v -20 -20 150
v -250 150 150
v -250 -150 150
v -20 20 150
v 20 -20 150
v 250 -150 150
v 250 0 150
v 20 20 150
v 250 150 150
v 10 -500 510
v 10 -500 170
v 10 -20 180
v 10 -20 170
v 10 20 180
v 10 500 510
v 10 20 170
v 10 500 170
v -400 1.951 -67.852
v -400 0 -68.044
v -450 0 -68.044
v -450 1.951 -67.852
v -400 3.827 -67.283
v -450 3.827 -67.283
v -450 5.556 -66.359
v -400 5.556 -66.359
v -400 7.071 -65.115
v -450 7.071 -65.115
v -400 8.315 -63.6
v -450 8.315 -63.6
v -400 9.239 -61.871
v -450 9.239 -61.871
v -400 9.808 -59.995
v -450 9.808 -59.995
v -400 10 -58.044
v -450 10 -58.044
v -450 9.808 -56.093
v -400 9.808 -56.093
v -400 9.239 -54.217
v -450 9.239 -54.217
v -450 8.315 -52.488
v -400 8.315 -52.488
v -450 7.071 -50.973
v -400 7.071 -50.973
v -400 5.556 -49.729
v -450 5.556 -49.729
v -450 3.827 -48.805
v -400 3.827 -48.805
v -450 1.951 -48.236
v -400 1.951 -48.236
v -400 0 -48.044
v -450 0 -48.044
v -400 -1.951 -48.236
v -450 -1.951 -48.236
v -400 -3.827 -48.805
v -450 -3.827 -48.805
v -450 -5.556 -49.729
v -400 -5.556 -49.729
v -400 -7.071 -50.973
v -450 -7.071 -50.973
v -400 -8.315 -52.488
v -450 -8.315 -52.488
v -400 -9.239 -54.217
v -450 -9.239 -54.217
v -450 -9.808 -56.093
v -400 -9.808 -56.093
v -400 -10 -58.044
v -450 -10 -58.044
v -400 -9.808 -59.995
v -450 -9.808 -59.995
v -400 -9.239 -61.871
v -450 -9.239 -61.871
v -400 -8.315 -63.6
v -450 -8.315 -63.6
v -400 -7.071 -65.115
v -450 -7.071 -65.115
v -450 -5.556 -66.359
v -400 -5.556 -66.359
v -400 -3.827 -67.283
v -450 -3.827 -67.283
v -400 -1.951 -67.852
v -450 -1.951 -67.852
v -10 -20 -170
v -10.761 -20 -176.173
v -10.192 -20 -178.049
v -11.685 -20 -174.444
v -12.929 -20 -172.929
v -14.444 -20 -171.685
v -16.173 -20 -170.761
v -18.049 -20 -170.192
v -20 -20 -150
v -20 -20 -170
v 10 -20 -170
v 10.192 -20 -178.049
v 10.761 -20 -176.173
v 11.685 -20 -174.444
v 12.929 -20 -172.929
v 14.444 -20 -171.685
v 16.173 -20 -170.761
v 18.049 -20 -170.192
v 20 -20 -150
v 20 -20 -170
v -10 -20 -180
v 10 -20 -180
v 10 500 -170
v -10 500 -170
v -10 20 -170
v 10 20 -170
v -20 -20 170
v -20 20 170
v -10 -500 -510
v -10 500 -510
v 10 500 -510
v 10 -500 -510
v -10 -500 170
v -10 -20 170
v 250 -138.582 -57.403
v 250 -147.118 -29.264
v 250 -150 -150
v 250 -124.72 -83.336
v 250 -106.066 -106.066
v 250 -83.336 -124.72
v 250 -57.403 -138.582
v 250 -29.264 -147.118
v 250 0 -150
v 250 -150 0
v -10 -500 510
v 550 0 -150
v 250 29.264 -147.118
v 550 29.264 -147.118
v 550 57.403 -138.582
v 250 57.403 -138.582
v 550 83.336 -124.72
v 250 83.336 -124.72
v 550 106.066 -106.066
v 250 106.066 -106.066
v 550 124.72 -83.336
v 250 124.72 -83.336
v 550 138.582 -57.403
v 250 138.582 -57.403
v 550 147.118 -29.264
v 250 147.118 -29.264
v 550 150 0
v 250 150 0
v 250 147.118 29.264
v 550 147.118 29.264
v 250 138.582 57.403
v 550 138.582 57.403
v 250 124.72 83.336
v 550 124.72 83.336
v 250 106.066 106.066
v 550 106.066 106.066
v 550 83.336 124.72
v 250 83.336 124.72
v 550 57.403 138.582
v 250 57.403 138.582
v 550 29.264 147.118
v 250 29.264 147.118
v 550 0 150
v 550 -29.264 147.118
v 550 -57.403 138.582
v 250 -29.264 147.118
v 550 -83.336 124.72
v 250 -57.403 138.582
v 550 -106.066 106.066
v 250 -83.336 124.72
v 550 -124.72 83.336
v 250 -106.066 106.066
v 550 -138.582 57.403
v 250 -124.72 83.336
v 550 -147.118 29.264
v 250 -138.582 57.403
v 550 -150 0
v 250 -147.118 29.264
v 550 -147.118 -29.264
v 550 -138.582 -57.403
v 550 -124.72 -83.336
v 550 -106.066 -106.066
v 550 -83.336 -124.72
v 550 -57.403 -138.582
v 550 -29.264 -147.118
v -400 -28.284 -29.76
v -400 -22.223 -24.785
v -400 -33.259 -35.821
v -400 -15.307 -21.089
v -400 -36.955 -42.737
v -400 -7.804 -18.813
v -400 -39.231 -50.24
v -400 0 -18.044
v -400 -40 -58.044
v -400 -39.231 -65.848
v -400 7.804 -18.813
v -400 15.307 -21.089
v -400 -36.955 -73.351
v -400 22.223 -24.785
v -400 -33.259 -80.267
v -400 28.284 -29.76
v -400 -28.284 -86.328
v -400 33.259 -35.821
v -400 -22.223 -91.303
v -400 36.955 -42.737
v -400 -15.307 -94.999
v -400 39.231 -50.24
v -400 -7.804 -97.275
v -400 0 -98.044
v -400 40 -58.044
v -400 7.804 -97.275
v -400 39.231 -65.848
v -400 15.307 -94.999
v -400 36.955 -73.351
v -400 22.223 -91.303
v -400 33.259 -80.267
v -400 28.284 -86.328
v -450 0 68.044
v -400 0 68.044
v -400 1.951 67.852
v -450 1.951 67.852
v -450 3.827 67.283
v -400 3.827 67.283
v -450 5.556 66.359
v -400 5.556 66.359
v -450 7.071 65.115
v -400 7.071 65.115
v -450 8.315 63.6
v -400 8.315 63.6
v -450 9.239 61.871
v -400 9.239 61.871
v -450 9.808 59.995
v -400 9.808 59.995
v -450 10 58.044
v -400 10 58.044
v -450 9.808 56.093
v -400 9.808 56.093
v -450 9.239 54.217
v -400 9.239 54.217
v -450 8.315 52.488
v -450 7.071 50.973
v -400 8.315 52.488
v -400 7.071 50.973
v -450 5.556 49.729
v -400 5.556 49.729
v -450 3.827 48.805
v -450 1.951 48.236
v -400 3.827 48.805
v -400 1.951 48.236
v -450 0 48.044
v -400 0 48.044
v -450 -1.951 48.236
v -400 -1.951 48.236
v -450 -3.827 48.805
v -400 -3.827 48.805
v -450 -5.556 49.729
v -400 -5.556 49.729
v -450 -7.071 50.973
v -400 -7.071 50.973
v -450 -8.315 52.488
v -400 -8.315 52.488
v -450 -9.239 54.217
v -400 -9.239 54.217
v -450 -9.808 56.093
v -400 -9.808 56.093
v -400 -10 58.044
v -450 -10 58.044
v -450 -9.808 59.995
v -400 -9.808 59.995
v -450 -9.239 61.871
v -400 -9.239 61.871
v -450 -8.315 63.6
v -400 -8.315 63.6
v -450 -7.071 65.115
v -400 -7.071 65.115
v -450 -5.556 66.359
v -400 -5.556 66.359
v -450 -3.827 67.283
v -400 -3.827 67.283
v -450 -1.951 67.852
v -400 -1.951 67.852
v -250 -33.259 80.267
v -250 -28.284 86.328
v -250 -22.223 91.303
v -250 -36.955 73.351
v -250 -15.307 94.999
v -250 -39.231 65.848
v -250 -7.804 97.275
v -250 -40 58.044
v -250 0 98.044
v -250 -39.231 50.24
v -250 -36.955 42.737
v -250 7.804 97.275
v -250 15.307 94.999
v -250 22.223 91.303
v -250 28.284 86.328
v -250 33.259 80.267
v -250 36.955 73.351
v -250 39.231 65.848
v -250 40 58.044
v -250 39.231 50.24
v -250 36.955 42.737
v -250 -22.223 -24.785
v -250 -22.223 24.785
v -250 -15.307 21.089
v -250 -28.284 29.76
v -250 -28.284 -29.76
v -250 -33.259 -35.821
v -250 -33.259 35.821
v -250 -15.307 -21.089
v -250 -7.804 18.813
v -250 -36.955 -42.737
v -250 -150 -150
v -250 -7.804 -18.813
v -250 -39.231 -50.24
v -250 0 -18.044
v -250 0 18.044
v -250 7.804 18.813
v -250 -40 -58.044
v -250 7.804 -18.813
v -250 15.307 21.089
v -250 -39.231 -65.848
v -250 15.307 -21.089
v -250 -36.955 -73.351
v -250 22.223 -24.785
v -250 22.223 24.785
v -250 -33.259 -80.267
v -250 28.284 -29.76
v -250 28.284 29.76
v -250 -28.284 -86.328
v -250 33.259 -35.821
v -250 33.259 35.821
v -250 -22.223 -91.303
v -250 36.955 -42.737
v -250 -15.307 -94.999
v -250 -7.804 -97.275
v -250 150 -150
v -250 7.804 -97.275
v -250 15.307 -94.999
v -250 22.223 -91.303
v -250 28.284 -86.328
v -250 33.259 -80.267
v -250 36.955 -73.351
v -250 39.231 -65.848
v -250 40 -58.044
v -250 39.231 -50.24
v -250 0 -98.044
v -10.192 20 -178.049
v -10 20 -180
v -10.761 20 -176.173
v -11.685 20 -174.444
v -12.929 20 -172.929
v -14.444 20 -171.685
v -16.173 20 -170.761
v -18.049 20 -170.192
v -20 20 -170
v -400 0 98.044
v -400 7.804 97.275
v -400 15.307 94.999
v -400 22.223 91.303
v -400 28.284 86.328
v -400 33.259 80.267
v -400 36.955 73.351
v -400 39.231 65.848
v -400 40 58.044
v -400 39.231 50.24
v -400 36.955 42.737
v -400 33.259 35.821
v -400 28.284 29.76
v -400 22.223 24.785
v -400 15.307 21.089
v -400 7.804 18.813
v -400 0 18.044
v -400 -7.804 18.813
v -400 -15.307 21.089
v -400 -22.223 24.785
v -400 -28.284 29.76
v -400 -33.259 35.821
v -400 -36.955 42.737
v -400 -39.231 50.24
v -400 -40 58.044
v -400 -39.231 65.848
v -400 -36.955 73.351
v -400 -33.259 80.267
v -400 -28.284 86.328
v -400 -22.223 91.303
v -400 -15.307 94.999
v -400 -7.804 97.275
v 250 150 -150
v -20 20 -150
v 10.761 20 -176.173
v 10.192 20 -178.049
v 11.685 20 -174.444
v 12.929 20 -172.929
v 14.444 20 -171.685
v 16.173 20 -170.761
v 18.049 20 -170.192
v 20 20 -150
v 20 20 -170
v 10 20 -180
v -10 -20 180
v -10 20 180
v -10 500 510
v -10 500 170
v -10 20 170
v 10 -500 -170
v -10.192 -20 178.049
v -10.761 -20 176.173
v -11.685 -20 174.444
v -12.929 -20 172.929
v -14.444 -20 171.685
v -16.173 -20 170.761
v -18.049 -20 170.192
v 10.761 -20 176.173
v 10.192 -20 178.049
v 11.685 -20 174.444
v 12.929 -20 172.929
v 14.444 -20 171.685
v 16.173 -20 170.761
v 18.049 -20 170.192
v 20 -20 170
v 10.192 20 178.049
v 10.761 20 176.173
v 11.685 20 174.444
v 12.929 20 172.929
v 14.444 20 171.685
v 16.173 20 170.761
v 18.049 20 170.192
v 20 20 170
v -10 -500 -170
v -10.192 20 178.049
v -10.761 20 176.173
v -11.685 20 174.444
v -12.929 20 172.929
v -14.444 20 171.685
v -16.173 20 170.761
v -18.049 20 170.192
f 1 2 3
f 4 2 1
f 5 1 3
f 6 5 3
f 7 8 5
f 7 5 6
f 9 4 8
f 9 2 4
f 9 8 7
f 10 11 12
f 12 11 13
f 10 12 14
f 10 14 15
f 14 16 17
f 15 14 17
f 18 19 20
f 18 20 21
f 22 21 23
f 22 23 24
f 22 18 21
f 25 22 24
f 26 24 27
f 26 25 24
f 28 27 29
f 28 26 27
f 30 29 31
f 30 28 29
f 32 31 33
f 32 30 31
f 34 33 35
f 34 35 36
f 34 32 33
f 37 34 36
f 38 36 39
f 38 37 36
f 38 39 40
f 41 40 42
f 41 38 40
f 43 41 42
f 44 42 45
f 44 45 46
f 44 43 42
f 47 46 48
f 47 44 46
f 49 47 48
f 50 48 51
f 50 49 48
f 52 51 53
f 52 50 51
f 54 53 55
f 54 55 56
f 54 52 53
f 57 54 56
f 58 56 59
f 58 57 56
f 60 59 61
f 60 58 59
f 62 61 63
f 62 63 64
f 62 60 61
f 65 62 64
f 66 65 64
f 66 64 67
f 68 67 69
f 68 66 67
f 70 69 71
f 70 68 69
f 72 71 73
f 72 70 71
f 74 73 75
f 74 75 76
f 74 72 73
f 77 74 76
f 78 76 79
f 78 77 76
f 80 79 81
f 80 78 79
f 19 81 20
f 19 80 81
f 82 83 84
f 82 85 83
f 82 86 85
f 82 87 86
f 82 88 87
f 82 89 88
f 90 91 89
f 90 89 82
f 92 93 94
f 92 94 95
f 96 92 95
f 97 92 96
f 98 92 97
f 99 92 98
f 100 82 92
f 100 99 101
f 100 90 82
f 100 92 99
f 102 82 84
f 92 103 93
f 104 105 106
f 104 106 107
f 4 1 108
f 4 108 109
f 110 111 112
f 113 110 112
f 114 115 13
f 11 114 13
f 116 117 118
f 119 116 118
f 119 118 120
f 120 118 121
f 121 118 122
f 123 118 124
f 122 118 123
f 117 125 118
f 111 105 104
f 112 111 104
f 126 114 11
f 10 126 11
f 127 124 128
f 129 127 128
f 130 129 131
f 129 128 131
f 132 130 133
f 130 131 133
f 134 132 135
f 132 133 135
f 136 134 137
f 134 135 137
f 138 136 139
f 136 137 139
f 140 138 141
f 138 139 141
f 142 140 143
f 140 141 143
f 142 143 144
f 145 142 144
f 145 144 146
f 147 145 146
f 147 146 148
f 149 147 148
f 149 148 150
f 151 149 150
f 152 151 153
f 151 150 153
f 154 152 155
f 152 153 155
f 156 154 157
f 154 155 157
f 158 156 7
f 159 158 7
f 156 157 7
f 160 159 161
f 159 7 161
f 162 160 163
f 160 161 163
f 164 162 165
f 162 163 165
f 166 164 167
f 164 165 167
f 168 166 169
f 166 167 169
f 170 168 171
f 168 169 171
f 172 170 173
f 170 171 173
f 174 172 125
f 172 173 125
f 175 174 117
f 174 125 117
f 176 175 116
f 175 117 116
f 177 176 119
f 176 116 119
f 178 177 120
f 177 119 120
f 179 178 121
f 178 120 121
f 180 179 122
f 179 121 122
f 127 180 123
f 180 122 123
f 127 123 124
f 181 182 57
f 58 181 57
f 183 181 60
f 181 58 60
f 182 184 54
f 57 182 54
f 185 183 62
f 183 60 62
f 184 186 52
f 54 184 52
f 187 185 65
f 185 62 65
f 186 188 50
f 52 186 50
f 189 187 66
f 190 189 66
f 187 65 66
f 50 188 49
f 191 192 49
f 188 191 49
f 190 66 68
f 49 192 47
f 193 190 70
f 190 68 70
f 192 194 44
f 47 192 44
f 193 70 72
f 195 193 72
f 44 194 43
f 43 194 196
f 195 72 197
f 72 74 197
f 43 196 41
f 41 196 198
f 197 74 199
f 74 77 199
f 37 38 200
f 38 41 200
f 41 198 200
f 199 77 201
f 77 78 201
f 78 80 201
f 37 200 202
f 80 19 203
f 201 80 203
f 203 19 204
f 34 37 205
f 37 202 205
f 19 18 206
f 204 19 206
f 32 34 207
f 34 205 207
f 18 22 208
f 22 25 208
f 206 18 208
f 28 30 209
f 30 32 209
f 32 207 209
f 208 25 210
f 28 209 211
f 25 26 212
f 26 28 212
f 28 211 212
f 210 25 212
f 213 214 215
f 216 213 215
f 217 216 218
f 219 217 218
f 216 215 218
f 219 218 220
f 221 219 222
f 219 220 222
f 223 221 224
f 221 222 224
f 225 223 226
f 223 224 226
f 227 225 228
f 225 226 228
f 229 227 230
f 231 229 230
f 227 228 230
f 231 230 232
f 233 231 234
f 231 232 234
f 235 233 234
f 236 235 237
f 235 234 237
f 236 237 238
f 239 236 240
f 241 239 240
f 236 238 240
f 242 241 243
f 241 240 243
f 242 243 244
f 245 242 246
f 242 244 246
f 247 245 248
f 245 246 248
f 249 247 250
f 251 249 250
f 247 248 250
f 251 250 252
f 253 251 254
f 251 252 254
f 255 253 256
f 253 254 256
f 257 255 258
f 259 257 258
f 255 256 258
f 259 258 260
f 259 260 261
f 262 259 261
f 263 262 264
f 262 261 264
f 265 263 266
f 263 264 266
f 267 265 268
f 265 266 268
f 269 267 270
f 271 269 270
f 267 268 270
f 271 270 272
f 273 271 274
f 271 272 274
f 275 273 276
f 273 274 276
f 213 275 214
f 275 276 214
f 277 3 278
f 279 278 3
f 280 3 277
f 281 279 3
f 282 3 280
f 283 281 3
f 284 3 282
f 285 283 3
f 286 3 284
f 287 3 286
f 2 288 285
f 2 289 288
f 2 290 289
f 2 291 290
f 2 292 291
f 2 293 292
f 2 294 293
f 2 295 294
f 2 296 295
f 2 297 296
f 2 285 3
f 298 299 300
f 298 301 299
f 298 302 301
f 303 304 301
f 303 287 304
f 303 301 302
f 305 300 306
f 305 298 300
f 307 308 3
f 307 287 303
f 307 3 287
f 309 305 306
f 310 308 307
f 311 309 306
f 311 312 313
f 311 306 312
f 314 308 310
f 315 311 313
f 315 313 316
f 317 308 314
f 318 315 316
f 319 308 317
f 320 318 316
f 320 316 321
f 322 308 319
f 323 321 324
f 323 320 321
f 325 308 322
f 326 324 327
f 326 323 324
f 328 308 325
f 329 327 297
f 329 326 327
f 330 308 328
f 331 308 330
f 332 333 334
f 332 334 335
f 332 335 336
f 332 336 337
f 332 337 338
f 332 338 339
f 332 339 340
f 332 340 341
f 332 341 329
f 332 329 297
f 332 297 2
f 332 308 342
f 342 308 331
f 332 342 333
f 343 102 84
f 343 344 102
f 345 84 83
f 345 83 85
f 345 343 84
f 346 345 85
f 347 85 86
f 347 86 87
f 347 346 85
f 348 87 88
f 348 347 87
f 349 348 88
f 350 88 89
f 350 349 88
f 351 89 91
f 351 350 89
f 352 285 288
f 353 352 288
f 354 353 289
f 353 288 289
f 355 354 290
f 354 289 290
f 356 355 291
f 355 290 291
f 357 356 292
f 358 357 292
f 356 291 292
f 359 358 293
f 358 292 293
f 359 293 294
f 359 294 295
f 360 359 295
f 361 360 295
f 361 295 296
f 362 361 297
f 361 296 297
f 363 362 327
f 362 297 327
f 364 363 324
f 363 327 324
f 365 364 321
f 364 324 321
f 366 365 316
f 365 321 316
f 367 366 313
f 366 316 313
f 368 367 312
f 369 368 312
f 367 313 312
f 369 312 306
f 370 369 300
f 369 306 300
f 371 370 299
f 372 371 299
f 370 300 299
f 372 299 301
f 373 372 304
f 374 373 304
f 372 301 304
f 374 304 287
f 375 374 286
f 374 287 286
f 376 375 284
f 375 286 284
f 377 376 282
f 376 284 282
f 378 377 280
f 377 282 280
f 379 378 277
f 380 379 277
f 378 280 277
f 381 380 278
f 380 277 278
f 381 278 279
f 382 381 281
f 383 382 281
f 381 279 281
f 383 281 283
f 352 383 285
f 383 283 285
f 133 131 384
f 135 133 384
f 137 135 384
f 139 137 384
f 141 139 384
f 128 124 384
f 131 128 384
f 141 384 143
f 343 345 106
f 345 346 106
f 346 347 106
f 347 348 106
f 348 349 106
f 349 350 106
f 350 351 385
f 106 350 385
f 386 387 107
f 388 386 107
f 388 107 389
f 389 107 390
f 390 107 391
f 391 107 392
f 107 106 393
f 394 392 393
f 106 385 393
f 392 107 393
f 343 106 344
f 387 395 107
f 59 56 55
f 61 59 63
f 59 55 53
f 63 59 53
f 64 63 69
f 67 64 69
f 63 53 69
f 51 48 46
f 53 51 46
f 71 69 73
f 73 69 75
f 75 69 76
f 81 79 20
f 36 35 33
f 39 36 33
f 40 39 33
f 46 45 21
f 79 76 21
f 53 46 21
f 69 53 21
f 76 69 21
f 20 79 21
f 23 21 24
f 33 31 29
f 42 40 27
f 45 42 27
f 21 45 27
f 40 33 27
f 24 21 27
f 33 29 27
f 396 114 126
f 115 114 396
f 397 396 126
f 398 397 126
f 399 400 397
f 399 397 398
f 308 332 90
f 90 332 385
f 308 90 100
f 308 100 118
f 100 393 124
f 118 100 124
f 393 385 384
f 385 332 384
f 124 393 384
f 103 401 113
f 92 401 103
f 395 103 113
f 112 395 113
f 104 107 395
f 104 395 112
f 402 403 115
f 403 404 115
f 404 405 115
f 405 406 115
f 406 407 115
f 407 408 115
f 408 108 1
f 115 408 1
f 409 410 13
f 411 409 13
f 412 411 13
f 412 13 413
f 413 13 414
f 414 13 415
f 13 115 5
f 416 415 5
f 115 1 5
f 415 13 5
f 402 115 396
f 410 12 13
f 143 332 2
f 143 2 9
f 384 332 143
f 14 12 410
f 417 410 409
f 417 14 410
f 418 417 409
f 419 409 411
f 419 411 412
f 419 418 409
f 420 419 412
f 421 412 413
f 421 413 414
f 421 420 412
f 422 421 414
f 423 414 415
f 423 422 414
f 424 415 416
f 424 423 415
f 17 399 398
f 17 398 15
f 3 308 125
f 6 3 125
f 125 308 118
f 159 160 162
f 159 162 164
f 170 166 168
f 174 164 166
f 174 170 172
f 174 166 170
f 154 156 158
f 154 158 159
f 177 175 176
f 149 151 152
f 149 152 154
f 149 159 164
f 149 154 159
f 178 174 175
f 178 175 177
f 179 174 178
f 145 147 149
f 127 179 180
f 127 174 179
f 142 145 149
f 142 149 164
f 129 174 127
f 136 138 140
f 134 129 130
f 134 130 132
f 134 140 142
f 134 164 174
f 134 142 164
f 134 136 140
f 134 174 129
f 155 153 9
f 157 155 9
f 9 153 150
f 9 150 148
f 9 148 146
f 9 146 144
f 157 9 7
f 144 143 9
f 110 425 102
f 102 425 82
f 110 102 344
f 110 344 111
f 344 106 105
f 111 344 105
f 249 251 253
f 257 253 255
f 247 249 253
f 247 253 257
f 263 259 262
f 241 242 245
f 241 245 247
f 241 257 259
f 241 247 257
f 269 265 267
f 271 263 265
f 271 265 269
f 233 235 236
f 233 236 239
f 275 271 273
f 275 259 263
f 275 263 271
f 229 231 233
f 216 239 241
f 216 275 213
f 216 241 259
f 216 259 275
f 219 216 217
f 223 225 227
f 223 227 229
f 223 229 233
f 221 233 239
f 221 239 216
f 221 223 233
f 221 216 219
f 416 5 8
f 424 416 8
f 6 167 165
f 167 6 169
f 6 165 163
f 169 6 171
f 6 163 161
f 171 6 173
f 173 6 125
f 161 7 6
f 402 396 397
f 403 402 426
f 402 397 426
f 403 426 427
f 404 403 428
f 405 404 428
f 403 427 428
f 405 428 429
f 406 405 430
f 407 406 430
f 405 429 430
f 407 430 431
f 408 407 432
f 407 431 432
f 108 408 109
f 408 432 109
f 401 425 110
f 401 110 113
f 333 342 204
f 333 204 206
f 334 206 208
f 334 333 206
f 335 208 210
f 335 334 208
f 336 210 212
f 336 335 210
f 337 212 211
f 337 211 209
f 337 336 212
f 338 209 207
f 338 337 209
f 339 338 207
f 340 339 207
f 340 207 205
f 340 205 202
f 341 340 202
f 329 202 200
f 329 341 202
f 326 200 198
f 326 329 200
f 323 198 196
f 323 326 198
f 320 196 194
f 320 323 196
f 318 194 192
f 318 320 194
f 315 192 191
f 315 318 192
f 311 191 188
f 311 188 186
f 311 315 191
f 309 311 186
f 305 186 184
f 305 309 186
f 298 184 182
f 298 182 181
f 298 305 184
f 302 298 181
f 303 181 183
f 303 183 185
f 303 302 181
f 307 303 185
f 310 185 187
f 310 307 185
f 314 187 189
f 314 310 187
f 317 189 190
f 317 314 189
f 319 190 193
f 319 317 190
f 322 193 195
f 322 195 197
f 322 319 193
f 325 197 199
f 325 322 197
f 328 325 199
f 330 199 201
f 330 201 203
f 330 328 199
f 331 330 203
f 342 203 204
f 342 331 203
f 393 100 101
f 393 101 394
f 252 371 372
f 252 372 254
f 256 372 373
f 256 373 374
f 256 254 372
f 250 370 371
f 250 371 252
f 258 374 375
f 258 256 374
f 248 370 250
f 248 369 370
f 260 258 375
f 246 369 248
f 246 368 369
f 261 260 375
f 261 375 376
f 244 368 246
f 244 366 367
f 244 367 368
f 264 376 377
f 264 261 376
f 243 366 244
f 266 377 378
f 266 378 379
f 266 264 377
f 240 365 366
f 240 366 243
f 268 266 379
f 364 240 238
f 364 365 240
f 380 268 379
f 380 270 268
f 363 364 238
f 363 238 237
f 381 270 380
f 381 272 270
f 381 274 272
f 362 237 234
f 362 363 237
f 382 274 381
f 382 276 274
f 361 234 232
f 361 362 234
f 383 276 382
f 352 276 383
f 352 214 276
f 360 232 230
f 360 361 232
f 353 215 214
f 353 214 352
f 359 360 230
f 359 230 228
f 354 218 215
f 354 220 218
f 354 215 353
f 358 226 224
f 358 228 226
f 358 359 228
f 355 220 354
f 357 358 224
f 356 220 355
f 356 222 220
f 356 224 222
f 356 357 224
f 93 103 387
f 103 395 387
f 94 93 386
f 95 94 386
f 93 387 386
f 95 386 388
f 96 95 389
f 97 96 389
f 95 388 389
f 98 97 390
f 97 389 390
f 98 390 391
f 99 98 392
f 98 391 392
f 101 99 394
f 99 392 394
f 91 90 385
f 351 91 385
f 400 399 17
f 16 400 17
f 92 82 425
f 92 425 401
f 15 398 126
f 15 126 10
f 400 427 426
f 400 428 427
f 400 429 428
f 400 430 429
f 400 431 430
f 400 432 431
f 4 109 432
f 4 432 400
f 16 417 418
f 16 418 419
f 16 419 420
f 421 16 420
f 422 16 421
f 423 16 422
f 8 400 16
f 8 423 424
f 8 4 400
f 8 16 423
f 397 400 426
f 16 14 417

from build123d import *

# Parameters (mm, degrees)
BOSS_EXTRUDE1_DEPTH      = 150
BOSS_EXTRUDE1_DEPTH_BACK = 150
SKETCH1_W                = 500
SKETCH1_H                = 300
SKETCH2_W                = 40
SKETCH2_H                = 40
BOSS_EXTRUDE2_DEPTH      = 20
SKETCH3_W                = 20
SKETCH3_H                = 1000
BOSS_EXTRUDE3_DEPTH      = 340
FILLET1_R                = 10
SKETCH4_R                = 40
BOSS_EXTRUDE4_DEPTH      = 150
SKETCH5_R                = 10
BOSS_EXTRUDE5_DEPTH      = 50
FILLET1_OF_MIRROR1_R     = 10
SKETCH7_R                = 150
BOSS_EXTRUDE6_DEPTH      = 300


with BuildPart() as part:
    # Sketch1 → Boss-Extrude1 (new, two sides: drawn at the far end of the back side and taken through both)
    with BuildSketch(Plane.XY.offset(-BOSS_EXTRUDE1_DEPTH_BACK)):
        Rectangle(SKETCH1_W, SKETCH1_H)
    extrude(amount=BOSS_EXTRUDE1_DEPTH + BOSS_EXTRUDE1_DEPTH_BACK)

    # Sketch2 → Boss-Extrude2 (add)
    with BuildSketch(Plane.XY.offset(150)):
        Rectangle(SKETCH2_W, SKETCH2_H)
    boss_extrude2 = extrude(amount=BOSS_EXTRUDE2_DEPTH)

    # Sketch3 → Boss-Extrude3 (add)
    with BuildSketch(Plane.XY.offset(170)):
        Rectangle(SKETCH3_W, SKETCH3_H)
    boss_extrude3 = extrude(amount=BOSS_EXTRUDE3_DEPTH)

    # Fillet1
    fillet1_edges = [part.edges().sort_by_distance(p)[0] for p in [
        (-10, 0, 170),
        (10, 0, 170),
    ]]
    fillet(fillet1_edges, radius=FILLET1_R - 0.0001)  # a hair under: the kernel refuses the full size

    # Sketch4 → Boss-Extrude4 (add)
    with BuildSketch(Plane.ZY.offset(250)):
        with Locations((58.043987529, 0)):
            Circle(SKETCH4_R)
    boss_extrude4 = extrude(amount=BOSS_EXTRUDE4_DEPTH)

    # Sketch5 → Boss-Extrude5 (add)
    with BuildSketch(Plane.ZY.offset(400)):
        with Locations((58.043987529, 0)):
            Circle(SKETCH5_R)
    boss_extrude5 = extrude(amount=BOSS_EXTRUDE5_DEPTH)

    # Mirror1: Boss-Extrude2, Boss-Extrude3, Boss-Extrude4, Boss-Extrude5 across plane
    add(boss_extrude2.mirror(Plane.XY))
    add(boss_extrude3.mirror(Plane.XY))
    add(boss_extrude4.mirror(Plane.XY))
    add(boss_extrude5.mirror(Plane.XY))

    # Fillet1 of Mirror1
    fillet1_of_mirror1_edges = [part.edges().sort_by_distance(p)[0] for p in [
        (-10, 0, -170),
        (10, 0, -170),
    ]]
    fillet(fillet1_of_mirror1_edges, radius=FILLET1_OF_MIRROR1_R - 0.0001)  # a hair under: the kernel refuses the full size

    # Sketch7 → Boss-Extrude6 (add)
    with BuildSketch(Plane(origin=(250, 0, 0), x_dir=(0, 0, -1), z_dir=(1, 0, 0))):
        Circle(SKETCH7_R)
    extrude(amount=BOSS_EXTRUDE6_DEPTH)


solid = part.part
